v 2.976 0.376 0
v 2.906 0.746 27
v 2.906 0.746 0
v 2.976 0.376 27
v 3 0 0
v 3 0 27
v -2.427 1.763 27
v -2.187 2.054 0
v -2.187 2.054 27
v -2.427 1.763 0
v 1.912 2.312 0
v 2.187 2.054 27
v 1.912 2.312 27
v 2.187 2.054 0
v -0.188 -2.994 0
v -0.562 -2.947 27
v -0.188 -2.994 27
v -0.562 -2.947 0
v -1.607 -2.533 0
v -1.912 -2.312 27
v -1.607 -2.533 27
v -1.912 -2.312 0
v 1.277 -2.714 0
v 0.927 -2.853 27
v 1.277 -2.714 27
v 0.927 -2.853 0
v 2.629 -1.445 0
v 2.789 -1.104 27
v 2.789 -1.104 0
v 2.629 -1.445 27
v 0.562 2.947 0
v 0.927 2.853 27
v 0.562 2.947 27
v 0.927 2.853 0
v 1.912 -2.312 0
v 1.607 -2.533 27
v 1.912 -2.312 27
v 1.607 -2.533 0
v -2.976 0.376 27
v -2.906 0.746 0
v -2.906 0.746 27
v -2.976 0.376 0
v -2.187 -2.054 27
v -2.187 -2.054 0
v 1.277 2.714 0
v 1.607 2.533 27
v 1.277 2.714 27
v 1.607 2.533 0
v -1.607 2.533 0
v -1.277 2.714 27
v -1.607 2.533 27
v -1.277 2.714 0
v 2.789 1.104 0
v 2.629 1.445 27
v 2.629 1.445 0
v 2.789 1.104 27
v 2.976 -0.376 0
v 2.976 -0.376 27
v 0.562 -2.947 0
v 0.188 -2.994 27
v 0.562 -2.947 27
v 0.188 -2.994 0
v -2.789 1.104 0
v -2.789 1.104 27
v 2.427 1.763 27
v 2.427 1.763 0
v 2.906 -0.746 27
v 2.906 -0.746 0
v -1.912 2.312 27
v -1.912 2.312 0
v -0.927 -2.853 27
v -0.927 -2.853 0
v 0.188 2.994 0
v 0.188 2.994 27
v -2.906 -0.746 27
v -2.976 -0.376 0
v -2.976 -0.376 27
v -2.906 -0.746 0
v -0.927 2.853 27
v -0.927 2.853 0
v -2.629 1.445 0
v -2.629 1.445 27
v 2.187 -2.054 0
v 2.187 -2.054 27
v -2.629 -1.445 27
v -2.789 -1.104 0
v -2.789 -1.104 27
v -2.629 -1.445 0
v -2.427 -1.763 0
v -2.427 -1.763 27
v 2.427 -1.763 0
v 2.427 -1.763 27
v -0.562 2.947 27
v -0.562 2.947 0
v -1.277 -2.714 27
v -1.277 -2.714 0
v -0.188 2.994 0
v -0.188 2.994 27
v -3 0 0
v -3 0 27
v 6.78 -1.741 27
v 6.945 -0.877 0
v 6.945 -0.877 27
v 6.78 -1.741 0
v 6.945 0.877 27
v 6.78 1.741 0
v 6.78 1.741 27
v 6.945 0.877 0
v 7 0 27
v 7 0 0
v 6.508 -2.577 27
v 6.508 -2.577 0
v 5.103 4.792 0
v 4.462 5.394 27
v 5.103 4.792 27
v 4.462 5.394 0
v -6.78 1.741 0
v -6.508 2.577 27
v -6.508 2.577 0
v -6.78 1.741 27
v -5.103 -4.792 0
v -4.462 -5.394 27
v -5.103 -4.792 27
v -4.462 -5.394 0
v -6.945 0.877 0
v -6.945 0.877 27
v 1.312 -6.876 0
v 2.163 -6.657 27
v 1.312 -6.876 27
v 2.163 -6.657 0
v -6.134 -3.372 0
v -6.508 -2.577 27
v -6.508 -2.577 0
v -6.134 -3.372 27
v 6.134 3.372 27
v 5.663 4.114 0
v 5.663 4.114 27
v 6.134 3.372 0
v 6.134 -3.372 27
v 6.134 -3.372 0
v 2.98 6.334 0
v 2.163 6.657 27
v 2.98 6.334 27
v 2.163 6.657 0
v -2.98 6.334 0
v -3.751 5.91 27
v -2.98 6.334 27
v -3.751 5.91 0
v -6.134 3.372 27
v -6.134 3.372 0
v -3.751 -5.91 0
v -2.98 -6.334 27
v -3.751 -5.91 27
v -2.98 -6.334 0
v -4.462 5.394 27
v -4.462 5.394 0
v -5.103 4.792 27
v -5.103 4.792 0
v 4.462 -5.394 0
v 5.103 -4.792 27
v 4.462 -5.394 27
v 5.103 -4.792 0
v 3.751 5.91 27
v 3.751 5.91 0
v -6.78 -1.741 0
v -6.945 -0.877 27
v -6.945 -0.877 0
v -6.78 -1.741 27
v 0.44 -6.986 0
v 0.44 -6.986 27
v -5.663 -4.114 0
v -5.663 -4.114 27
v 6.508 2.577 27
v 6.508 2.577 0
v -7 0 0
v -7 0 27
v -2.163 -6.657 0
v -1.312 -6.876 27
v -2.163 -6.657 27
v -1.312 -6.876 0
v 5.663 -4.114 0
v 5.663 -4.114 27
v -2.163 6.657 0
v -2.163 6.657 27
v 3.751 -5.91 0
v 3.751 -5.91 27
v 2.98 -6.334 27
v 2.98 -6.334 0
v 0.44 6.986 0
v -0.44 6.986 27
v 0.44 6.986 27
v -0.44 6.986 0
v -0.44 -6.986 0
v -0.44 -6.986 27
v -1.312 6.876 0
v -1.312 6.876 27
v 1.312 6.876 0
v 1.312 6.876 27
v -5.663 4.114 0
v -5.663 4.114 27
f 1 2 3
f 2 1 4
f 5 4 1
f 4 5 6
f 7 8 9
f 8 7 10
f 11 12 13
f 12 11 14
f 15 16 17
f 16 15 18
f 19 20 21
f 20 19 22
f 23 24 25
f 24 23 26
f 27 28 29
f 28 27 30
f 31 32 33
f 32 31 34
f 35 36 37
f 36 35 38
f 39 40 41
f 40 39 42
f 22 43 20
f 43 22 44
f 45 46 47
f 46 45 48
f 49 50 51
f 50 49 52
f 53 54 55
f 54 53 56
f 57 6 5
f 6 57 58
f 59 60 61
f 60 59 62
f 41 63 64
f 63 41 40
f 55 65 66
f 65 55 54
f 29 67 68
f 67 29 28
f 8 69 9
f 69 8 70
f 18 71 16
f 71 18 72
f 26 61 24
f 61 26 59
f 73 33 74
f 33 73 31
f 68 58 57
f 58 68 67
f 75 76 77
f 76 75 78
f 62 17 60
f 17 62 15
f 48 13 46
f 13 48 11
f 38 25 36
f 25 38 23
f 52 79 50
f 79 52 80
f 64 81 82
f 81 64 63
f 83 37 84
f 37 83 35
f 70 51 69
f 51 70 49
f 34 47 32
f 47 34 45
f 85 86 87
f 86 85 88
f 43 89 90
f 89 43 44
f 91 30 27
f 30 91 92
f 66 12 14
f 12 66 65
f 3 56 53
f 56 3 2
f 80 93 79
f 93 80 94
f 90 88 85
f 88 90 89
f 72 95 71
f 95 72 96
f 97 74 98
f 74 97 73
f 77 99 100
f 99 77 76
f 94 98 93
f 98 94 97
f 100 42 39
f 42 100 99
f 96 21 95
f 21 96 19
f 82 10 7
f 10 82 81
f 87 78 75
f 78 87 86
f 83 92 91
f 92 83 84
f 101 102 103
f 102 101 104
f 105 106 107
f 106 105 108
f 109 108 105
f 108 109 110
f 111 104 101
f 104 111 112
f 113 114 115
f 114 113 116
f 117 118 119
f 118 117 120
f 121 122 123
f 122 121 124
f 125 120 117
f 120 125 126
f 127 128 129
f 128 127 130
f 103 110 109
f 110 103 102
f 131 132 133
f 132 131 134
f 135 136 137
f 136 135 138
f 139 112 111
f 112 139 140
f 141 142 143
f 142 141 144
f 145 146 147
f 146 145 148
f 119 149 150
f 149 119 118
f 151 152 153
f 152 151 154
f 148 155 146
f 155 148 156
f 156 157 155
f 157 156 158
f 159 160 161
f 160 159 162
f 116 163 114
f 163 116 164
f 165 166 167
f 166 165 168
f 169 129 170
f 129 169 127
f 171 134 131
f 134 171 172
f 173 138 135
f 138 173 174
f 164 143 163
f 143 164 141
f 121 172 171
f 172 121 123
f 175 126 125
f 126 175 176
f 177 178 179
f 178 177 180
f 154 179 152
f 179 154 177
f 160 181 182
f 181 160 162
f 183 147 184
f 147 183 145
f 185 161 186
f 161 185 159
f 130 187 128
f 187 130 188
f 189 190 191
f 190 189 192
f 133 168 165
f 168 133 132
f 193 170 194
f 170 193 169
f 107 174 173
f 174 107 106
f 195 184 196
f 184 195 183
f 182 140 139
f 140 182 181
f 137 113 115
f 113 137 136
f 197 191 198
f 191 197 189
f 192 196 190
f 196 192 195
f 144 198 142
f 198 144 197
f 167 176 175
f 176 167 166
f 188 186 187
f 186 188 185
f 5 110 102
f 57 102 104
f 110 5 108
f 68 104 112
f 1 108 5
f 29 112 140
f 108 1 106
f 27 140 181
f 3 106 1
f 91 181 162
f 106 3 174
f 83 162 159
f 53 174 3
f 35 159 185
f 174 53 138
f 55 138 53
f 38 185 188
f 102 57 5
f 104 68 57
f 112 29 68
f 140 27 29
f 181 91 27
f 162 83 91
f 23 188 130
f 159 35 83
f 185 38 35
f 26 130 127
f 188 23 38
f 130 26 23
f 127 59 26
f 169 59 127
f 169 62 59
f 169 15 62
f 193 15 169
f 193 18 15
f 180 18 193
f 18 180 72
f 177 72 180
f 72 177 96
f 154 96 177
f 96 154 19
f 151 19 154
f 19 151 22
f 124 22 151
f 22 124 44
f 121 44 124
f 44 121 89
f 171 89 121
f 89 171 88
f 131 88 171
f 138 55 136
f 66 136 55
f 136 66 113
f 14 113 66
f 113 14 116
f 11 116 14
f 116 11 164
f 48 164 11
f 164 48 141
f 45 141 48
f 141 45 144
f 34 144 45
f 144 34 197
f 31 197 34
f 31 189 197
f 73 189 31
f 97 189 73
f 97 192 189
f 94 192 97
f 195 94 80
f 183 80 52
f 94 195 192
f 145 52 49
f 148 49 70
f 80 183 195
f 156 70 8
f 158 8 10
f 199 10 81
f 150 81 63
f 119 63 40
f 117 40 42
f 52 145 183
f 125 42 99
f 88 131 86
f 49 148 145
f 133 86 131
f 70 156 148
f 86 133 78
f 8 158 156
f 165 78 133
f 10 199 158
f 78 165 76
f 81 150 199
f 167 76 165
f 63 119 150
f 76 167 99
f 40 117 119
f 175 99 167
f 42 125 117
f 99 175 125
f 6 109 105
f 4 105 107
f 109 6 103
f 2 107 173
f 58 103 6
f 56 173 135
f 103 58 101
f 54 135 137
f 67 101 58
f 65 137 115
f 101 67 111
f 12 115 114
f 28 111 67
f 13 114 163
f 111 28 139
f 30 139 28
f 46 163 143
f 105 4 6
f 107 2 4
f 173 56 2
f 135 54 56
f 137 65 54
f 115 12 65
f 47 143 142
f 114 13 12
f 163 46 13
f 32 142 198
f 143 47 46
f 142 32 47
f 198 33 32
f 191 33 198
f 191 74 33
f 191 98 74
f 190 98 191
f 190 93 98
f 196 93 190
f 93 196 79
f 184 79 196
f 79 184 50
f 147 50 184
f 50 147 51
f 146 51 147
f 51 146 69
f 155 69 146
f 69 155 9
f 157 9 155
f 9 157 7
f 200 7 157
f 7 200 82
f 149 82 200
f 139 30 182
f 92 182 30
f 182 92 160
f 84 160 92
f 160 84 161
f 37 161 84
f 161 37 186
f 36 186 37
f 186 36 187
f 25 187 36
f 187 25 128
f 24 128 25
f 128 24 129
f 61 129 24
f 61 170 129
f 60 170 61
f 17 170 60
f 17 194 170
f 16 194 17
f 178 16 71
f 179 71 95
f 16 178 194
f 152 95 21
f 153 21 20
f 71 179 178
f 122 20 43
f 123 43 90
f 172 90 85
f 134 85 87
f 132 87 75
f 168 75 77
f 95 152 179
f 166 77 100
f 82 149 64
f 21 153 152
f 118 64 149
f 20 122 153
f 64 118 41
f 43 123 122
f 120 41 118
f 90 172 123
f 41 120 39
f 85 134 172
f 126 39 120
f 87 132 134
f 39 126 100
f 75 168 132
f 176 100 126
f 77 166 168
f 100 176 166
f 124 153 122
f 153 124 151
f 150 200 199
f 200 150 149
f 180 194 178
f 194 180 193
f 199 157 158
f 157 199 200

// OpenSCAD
$fn = 50;


difference() {
	union() {
		*color(alpha = 1.0000000000, c = "gray") {
			translate(v = [0, 7, 0]) {
				linear_extrude(height = 1) {
					text(font = "Arial:style=Bold", halign = "center", size = 4.5000000000, text = "COMMENT plate main", valign = "center");
				}
			}
		}
		cylinder(h = 27, r = 7.0000000000);
	}
	union() {
		*color(alpha = 1.0000000000, c = "gray") {
			translate(v = [0, 7, 0]) {
				linear_extrude(height = 1) {
					text(font = "Arial:style=Bold", halign = "center", size = 4.5000000000, text = "COMMENT holes main", valign = "center");
				}
			}
		}
		translate(v = [0, 0, -100]) {
			cylinder(h = 200, r = 3.0000000000);
		}
		translate(v = [0, 0, -100]) {
			cylinder(h = 200, r = 1.5000000000);
		}
	}
}
